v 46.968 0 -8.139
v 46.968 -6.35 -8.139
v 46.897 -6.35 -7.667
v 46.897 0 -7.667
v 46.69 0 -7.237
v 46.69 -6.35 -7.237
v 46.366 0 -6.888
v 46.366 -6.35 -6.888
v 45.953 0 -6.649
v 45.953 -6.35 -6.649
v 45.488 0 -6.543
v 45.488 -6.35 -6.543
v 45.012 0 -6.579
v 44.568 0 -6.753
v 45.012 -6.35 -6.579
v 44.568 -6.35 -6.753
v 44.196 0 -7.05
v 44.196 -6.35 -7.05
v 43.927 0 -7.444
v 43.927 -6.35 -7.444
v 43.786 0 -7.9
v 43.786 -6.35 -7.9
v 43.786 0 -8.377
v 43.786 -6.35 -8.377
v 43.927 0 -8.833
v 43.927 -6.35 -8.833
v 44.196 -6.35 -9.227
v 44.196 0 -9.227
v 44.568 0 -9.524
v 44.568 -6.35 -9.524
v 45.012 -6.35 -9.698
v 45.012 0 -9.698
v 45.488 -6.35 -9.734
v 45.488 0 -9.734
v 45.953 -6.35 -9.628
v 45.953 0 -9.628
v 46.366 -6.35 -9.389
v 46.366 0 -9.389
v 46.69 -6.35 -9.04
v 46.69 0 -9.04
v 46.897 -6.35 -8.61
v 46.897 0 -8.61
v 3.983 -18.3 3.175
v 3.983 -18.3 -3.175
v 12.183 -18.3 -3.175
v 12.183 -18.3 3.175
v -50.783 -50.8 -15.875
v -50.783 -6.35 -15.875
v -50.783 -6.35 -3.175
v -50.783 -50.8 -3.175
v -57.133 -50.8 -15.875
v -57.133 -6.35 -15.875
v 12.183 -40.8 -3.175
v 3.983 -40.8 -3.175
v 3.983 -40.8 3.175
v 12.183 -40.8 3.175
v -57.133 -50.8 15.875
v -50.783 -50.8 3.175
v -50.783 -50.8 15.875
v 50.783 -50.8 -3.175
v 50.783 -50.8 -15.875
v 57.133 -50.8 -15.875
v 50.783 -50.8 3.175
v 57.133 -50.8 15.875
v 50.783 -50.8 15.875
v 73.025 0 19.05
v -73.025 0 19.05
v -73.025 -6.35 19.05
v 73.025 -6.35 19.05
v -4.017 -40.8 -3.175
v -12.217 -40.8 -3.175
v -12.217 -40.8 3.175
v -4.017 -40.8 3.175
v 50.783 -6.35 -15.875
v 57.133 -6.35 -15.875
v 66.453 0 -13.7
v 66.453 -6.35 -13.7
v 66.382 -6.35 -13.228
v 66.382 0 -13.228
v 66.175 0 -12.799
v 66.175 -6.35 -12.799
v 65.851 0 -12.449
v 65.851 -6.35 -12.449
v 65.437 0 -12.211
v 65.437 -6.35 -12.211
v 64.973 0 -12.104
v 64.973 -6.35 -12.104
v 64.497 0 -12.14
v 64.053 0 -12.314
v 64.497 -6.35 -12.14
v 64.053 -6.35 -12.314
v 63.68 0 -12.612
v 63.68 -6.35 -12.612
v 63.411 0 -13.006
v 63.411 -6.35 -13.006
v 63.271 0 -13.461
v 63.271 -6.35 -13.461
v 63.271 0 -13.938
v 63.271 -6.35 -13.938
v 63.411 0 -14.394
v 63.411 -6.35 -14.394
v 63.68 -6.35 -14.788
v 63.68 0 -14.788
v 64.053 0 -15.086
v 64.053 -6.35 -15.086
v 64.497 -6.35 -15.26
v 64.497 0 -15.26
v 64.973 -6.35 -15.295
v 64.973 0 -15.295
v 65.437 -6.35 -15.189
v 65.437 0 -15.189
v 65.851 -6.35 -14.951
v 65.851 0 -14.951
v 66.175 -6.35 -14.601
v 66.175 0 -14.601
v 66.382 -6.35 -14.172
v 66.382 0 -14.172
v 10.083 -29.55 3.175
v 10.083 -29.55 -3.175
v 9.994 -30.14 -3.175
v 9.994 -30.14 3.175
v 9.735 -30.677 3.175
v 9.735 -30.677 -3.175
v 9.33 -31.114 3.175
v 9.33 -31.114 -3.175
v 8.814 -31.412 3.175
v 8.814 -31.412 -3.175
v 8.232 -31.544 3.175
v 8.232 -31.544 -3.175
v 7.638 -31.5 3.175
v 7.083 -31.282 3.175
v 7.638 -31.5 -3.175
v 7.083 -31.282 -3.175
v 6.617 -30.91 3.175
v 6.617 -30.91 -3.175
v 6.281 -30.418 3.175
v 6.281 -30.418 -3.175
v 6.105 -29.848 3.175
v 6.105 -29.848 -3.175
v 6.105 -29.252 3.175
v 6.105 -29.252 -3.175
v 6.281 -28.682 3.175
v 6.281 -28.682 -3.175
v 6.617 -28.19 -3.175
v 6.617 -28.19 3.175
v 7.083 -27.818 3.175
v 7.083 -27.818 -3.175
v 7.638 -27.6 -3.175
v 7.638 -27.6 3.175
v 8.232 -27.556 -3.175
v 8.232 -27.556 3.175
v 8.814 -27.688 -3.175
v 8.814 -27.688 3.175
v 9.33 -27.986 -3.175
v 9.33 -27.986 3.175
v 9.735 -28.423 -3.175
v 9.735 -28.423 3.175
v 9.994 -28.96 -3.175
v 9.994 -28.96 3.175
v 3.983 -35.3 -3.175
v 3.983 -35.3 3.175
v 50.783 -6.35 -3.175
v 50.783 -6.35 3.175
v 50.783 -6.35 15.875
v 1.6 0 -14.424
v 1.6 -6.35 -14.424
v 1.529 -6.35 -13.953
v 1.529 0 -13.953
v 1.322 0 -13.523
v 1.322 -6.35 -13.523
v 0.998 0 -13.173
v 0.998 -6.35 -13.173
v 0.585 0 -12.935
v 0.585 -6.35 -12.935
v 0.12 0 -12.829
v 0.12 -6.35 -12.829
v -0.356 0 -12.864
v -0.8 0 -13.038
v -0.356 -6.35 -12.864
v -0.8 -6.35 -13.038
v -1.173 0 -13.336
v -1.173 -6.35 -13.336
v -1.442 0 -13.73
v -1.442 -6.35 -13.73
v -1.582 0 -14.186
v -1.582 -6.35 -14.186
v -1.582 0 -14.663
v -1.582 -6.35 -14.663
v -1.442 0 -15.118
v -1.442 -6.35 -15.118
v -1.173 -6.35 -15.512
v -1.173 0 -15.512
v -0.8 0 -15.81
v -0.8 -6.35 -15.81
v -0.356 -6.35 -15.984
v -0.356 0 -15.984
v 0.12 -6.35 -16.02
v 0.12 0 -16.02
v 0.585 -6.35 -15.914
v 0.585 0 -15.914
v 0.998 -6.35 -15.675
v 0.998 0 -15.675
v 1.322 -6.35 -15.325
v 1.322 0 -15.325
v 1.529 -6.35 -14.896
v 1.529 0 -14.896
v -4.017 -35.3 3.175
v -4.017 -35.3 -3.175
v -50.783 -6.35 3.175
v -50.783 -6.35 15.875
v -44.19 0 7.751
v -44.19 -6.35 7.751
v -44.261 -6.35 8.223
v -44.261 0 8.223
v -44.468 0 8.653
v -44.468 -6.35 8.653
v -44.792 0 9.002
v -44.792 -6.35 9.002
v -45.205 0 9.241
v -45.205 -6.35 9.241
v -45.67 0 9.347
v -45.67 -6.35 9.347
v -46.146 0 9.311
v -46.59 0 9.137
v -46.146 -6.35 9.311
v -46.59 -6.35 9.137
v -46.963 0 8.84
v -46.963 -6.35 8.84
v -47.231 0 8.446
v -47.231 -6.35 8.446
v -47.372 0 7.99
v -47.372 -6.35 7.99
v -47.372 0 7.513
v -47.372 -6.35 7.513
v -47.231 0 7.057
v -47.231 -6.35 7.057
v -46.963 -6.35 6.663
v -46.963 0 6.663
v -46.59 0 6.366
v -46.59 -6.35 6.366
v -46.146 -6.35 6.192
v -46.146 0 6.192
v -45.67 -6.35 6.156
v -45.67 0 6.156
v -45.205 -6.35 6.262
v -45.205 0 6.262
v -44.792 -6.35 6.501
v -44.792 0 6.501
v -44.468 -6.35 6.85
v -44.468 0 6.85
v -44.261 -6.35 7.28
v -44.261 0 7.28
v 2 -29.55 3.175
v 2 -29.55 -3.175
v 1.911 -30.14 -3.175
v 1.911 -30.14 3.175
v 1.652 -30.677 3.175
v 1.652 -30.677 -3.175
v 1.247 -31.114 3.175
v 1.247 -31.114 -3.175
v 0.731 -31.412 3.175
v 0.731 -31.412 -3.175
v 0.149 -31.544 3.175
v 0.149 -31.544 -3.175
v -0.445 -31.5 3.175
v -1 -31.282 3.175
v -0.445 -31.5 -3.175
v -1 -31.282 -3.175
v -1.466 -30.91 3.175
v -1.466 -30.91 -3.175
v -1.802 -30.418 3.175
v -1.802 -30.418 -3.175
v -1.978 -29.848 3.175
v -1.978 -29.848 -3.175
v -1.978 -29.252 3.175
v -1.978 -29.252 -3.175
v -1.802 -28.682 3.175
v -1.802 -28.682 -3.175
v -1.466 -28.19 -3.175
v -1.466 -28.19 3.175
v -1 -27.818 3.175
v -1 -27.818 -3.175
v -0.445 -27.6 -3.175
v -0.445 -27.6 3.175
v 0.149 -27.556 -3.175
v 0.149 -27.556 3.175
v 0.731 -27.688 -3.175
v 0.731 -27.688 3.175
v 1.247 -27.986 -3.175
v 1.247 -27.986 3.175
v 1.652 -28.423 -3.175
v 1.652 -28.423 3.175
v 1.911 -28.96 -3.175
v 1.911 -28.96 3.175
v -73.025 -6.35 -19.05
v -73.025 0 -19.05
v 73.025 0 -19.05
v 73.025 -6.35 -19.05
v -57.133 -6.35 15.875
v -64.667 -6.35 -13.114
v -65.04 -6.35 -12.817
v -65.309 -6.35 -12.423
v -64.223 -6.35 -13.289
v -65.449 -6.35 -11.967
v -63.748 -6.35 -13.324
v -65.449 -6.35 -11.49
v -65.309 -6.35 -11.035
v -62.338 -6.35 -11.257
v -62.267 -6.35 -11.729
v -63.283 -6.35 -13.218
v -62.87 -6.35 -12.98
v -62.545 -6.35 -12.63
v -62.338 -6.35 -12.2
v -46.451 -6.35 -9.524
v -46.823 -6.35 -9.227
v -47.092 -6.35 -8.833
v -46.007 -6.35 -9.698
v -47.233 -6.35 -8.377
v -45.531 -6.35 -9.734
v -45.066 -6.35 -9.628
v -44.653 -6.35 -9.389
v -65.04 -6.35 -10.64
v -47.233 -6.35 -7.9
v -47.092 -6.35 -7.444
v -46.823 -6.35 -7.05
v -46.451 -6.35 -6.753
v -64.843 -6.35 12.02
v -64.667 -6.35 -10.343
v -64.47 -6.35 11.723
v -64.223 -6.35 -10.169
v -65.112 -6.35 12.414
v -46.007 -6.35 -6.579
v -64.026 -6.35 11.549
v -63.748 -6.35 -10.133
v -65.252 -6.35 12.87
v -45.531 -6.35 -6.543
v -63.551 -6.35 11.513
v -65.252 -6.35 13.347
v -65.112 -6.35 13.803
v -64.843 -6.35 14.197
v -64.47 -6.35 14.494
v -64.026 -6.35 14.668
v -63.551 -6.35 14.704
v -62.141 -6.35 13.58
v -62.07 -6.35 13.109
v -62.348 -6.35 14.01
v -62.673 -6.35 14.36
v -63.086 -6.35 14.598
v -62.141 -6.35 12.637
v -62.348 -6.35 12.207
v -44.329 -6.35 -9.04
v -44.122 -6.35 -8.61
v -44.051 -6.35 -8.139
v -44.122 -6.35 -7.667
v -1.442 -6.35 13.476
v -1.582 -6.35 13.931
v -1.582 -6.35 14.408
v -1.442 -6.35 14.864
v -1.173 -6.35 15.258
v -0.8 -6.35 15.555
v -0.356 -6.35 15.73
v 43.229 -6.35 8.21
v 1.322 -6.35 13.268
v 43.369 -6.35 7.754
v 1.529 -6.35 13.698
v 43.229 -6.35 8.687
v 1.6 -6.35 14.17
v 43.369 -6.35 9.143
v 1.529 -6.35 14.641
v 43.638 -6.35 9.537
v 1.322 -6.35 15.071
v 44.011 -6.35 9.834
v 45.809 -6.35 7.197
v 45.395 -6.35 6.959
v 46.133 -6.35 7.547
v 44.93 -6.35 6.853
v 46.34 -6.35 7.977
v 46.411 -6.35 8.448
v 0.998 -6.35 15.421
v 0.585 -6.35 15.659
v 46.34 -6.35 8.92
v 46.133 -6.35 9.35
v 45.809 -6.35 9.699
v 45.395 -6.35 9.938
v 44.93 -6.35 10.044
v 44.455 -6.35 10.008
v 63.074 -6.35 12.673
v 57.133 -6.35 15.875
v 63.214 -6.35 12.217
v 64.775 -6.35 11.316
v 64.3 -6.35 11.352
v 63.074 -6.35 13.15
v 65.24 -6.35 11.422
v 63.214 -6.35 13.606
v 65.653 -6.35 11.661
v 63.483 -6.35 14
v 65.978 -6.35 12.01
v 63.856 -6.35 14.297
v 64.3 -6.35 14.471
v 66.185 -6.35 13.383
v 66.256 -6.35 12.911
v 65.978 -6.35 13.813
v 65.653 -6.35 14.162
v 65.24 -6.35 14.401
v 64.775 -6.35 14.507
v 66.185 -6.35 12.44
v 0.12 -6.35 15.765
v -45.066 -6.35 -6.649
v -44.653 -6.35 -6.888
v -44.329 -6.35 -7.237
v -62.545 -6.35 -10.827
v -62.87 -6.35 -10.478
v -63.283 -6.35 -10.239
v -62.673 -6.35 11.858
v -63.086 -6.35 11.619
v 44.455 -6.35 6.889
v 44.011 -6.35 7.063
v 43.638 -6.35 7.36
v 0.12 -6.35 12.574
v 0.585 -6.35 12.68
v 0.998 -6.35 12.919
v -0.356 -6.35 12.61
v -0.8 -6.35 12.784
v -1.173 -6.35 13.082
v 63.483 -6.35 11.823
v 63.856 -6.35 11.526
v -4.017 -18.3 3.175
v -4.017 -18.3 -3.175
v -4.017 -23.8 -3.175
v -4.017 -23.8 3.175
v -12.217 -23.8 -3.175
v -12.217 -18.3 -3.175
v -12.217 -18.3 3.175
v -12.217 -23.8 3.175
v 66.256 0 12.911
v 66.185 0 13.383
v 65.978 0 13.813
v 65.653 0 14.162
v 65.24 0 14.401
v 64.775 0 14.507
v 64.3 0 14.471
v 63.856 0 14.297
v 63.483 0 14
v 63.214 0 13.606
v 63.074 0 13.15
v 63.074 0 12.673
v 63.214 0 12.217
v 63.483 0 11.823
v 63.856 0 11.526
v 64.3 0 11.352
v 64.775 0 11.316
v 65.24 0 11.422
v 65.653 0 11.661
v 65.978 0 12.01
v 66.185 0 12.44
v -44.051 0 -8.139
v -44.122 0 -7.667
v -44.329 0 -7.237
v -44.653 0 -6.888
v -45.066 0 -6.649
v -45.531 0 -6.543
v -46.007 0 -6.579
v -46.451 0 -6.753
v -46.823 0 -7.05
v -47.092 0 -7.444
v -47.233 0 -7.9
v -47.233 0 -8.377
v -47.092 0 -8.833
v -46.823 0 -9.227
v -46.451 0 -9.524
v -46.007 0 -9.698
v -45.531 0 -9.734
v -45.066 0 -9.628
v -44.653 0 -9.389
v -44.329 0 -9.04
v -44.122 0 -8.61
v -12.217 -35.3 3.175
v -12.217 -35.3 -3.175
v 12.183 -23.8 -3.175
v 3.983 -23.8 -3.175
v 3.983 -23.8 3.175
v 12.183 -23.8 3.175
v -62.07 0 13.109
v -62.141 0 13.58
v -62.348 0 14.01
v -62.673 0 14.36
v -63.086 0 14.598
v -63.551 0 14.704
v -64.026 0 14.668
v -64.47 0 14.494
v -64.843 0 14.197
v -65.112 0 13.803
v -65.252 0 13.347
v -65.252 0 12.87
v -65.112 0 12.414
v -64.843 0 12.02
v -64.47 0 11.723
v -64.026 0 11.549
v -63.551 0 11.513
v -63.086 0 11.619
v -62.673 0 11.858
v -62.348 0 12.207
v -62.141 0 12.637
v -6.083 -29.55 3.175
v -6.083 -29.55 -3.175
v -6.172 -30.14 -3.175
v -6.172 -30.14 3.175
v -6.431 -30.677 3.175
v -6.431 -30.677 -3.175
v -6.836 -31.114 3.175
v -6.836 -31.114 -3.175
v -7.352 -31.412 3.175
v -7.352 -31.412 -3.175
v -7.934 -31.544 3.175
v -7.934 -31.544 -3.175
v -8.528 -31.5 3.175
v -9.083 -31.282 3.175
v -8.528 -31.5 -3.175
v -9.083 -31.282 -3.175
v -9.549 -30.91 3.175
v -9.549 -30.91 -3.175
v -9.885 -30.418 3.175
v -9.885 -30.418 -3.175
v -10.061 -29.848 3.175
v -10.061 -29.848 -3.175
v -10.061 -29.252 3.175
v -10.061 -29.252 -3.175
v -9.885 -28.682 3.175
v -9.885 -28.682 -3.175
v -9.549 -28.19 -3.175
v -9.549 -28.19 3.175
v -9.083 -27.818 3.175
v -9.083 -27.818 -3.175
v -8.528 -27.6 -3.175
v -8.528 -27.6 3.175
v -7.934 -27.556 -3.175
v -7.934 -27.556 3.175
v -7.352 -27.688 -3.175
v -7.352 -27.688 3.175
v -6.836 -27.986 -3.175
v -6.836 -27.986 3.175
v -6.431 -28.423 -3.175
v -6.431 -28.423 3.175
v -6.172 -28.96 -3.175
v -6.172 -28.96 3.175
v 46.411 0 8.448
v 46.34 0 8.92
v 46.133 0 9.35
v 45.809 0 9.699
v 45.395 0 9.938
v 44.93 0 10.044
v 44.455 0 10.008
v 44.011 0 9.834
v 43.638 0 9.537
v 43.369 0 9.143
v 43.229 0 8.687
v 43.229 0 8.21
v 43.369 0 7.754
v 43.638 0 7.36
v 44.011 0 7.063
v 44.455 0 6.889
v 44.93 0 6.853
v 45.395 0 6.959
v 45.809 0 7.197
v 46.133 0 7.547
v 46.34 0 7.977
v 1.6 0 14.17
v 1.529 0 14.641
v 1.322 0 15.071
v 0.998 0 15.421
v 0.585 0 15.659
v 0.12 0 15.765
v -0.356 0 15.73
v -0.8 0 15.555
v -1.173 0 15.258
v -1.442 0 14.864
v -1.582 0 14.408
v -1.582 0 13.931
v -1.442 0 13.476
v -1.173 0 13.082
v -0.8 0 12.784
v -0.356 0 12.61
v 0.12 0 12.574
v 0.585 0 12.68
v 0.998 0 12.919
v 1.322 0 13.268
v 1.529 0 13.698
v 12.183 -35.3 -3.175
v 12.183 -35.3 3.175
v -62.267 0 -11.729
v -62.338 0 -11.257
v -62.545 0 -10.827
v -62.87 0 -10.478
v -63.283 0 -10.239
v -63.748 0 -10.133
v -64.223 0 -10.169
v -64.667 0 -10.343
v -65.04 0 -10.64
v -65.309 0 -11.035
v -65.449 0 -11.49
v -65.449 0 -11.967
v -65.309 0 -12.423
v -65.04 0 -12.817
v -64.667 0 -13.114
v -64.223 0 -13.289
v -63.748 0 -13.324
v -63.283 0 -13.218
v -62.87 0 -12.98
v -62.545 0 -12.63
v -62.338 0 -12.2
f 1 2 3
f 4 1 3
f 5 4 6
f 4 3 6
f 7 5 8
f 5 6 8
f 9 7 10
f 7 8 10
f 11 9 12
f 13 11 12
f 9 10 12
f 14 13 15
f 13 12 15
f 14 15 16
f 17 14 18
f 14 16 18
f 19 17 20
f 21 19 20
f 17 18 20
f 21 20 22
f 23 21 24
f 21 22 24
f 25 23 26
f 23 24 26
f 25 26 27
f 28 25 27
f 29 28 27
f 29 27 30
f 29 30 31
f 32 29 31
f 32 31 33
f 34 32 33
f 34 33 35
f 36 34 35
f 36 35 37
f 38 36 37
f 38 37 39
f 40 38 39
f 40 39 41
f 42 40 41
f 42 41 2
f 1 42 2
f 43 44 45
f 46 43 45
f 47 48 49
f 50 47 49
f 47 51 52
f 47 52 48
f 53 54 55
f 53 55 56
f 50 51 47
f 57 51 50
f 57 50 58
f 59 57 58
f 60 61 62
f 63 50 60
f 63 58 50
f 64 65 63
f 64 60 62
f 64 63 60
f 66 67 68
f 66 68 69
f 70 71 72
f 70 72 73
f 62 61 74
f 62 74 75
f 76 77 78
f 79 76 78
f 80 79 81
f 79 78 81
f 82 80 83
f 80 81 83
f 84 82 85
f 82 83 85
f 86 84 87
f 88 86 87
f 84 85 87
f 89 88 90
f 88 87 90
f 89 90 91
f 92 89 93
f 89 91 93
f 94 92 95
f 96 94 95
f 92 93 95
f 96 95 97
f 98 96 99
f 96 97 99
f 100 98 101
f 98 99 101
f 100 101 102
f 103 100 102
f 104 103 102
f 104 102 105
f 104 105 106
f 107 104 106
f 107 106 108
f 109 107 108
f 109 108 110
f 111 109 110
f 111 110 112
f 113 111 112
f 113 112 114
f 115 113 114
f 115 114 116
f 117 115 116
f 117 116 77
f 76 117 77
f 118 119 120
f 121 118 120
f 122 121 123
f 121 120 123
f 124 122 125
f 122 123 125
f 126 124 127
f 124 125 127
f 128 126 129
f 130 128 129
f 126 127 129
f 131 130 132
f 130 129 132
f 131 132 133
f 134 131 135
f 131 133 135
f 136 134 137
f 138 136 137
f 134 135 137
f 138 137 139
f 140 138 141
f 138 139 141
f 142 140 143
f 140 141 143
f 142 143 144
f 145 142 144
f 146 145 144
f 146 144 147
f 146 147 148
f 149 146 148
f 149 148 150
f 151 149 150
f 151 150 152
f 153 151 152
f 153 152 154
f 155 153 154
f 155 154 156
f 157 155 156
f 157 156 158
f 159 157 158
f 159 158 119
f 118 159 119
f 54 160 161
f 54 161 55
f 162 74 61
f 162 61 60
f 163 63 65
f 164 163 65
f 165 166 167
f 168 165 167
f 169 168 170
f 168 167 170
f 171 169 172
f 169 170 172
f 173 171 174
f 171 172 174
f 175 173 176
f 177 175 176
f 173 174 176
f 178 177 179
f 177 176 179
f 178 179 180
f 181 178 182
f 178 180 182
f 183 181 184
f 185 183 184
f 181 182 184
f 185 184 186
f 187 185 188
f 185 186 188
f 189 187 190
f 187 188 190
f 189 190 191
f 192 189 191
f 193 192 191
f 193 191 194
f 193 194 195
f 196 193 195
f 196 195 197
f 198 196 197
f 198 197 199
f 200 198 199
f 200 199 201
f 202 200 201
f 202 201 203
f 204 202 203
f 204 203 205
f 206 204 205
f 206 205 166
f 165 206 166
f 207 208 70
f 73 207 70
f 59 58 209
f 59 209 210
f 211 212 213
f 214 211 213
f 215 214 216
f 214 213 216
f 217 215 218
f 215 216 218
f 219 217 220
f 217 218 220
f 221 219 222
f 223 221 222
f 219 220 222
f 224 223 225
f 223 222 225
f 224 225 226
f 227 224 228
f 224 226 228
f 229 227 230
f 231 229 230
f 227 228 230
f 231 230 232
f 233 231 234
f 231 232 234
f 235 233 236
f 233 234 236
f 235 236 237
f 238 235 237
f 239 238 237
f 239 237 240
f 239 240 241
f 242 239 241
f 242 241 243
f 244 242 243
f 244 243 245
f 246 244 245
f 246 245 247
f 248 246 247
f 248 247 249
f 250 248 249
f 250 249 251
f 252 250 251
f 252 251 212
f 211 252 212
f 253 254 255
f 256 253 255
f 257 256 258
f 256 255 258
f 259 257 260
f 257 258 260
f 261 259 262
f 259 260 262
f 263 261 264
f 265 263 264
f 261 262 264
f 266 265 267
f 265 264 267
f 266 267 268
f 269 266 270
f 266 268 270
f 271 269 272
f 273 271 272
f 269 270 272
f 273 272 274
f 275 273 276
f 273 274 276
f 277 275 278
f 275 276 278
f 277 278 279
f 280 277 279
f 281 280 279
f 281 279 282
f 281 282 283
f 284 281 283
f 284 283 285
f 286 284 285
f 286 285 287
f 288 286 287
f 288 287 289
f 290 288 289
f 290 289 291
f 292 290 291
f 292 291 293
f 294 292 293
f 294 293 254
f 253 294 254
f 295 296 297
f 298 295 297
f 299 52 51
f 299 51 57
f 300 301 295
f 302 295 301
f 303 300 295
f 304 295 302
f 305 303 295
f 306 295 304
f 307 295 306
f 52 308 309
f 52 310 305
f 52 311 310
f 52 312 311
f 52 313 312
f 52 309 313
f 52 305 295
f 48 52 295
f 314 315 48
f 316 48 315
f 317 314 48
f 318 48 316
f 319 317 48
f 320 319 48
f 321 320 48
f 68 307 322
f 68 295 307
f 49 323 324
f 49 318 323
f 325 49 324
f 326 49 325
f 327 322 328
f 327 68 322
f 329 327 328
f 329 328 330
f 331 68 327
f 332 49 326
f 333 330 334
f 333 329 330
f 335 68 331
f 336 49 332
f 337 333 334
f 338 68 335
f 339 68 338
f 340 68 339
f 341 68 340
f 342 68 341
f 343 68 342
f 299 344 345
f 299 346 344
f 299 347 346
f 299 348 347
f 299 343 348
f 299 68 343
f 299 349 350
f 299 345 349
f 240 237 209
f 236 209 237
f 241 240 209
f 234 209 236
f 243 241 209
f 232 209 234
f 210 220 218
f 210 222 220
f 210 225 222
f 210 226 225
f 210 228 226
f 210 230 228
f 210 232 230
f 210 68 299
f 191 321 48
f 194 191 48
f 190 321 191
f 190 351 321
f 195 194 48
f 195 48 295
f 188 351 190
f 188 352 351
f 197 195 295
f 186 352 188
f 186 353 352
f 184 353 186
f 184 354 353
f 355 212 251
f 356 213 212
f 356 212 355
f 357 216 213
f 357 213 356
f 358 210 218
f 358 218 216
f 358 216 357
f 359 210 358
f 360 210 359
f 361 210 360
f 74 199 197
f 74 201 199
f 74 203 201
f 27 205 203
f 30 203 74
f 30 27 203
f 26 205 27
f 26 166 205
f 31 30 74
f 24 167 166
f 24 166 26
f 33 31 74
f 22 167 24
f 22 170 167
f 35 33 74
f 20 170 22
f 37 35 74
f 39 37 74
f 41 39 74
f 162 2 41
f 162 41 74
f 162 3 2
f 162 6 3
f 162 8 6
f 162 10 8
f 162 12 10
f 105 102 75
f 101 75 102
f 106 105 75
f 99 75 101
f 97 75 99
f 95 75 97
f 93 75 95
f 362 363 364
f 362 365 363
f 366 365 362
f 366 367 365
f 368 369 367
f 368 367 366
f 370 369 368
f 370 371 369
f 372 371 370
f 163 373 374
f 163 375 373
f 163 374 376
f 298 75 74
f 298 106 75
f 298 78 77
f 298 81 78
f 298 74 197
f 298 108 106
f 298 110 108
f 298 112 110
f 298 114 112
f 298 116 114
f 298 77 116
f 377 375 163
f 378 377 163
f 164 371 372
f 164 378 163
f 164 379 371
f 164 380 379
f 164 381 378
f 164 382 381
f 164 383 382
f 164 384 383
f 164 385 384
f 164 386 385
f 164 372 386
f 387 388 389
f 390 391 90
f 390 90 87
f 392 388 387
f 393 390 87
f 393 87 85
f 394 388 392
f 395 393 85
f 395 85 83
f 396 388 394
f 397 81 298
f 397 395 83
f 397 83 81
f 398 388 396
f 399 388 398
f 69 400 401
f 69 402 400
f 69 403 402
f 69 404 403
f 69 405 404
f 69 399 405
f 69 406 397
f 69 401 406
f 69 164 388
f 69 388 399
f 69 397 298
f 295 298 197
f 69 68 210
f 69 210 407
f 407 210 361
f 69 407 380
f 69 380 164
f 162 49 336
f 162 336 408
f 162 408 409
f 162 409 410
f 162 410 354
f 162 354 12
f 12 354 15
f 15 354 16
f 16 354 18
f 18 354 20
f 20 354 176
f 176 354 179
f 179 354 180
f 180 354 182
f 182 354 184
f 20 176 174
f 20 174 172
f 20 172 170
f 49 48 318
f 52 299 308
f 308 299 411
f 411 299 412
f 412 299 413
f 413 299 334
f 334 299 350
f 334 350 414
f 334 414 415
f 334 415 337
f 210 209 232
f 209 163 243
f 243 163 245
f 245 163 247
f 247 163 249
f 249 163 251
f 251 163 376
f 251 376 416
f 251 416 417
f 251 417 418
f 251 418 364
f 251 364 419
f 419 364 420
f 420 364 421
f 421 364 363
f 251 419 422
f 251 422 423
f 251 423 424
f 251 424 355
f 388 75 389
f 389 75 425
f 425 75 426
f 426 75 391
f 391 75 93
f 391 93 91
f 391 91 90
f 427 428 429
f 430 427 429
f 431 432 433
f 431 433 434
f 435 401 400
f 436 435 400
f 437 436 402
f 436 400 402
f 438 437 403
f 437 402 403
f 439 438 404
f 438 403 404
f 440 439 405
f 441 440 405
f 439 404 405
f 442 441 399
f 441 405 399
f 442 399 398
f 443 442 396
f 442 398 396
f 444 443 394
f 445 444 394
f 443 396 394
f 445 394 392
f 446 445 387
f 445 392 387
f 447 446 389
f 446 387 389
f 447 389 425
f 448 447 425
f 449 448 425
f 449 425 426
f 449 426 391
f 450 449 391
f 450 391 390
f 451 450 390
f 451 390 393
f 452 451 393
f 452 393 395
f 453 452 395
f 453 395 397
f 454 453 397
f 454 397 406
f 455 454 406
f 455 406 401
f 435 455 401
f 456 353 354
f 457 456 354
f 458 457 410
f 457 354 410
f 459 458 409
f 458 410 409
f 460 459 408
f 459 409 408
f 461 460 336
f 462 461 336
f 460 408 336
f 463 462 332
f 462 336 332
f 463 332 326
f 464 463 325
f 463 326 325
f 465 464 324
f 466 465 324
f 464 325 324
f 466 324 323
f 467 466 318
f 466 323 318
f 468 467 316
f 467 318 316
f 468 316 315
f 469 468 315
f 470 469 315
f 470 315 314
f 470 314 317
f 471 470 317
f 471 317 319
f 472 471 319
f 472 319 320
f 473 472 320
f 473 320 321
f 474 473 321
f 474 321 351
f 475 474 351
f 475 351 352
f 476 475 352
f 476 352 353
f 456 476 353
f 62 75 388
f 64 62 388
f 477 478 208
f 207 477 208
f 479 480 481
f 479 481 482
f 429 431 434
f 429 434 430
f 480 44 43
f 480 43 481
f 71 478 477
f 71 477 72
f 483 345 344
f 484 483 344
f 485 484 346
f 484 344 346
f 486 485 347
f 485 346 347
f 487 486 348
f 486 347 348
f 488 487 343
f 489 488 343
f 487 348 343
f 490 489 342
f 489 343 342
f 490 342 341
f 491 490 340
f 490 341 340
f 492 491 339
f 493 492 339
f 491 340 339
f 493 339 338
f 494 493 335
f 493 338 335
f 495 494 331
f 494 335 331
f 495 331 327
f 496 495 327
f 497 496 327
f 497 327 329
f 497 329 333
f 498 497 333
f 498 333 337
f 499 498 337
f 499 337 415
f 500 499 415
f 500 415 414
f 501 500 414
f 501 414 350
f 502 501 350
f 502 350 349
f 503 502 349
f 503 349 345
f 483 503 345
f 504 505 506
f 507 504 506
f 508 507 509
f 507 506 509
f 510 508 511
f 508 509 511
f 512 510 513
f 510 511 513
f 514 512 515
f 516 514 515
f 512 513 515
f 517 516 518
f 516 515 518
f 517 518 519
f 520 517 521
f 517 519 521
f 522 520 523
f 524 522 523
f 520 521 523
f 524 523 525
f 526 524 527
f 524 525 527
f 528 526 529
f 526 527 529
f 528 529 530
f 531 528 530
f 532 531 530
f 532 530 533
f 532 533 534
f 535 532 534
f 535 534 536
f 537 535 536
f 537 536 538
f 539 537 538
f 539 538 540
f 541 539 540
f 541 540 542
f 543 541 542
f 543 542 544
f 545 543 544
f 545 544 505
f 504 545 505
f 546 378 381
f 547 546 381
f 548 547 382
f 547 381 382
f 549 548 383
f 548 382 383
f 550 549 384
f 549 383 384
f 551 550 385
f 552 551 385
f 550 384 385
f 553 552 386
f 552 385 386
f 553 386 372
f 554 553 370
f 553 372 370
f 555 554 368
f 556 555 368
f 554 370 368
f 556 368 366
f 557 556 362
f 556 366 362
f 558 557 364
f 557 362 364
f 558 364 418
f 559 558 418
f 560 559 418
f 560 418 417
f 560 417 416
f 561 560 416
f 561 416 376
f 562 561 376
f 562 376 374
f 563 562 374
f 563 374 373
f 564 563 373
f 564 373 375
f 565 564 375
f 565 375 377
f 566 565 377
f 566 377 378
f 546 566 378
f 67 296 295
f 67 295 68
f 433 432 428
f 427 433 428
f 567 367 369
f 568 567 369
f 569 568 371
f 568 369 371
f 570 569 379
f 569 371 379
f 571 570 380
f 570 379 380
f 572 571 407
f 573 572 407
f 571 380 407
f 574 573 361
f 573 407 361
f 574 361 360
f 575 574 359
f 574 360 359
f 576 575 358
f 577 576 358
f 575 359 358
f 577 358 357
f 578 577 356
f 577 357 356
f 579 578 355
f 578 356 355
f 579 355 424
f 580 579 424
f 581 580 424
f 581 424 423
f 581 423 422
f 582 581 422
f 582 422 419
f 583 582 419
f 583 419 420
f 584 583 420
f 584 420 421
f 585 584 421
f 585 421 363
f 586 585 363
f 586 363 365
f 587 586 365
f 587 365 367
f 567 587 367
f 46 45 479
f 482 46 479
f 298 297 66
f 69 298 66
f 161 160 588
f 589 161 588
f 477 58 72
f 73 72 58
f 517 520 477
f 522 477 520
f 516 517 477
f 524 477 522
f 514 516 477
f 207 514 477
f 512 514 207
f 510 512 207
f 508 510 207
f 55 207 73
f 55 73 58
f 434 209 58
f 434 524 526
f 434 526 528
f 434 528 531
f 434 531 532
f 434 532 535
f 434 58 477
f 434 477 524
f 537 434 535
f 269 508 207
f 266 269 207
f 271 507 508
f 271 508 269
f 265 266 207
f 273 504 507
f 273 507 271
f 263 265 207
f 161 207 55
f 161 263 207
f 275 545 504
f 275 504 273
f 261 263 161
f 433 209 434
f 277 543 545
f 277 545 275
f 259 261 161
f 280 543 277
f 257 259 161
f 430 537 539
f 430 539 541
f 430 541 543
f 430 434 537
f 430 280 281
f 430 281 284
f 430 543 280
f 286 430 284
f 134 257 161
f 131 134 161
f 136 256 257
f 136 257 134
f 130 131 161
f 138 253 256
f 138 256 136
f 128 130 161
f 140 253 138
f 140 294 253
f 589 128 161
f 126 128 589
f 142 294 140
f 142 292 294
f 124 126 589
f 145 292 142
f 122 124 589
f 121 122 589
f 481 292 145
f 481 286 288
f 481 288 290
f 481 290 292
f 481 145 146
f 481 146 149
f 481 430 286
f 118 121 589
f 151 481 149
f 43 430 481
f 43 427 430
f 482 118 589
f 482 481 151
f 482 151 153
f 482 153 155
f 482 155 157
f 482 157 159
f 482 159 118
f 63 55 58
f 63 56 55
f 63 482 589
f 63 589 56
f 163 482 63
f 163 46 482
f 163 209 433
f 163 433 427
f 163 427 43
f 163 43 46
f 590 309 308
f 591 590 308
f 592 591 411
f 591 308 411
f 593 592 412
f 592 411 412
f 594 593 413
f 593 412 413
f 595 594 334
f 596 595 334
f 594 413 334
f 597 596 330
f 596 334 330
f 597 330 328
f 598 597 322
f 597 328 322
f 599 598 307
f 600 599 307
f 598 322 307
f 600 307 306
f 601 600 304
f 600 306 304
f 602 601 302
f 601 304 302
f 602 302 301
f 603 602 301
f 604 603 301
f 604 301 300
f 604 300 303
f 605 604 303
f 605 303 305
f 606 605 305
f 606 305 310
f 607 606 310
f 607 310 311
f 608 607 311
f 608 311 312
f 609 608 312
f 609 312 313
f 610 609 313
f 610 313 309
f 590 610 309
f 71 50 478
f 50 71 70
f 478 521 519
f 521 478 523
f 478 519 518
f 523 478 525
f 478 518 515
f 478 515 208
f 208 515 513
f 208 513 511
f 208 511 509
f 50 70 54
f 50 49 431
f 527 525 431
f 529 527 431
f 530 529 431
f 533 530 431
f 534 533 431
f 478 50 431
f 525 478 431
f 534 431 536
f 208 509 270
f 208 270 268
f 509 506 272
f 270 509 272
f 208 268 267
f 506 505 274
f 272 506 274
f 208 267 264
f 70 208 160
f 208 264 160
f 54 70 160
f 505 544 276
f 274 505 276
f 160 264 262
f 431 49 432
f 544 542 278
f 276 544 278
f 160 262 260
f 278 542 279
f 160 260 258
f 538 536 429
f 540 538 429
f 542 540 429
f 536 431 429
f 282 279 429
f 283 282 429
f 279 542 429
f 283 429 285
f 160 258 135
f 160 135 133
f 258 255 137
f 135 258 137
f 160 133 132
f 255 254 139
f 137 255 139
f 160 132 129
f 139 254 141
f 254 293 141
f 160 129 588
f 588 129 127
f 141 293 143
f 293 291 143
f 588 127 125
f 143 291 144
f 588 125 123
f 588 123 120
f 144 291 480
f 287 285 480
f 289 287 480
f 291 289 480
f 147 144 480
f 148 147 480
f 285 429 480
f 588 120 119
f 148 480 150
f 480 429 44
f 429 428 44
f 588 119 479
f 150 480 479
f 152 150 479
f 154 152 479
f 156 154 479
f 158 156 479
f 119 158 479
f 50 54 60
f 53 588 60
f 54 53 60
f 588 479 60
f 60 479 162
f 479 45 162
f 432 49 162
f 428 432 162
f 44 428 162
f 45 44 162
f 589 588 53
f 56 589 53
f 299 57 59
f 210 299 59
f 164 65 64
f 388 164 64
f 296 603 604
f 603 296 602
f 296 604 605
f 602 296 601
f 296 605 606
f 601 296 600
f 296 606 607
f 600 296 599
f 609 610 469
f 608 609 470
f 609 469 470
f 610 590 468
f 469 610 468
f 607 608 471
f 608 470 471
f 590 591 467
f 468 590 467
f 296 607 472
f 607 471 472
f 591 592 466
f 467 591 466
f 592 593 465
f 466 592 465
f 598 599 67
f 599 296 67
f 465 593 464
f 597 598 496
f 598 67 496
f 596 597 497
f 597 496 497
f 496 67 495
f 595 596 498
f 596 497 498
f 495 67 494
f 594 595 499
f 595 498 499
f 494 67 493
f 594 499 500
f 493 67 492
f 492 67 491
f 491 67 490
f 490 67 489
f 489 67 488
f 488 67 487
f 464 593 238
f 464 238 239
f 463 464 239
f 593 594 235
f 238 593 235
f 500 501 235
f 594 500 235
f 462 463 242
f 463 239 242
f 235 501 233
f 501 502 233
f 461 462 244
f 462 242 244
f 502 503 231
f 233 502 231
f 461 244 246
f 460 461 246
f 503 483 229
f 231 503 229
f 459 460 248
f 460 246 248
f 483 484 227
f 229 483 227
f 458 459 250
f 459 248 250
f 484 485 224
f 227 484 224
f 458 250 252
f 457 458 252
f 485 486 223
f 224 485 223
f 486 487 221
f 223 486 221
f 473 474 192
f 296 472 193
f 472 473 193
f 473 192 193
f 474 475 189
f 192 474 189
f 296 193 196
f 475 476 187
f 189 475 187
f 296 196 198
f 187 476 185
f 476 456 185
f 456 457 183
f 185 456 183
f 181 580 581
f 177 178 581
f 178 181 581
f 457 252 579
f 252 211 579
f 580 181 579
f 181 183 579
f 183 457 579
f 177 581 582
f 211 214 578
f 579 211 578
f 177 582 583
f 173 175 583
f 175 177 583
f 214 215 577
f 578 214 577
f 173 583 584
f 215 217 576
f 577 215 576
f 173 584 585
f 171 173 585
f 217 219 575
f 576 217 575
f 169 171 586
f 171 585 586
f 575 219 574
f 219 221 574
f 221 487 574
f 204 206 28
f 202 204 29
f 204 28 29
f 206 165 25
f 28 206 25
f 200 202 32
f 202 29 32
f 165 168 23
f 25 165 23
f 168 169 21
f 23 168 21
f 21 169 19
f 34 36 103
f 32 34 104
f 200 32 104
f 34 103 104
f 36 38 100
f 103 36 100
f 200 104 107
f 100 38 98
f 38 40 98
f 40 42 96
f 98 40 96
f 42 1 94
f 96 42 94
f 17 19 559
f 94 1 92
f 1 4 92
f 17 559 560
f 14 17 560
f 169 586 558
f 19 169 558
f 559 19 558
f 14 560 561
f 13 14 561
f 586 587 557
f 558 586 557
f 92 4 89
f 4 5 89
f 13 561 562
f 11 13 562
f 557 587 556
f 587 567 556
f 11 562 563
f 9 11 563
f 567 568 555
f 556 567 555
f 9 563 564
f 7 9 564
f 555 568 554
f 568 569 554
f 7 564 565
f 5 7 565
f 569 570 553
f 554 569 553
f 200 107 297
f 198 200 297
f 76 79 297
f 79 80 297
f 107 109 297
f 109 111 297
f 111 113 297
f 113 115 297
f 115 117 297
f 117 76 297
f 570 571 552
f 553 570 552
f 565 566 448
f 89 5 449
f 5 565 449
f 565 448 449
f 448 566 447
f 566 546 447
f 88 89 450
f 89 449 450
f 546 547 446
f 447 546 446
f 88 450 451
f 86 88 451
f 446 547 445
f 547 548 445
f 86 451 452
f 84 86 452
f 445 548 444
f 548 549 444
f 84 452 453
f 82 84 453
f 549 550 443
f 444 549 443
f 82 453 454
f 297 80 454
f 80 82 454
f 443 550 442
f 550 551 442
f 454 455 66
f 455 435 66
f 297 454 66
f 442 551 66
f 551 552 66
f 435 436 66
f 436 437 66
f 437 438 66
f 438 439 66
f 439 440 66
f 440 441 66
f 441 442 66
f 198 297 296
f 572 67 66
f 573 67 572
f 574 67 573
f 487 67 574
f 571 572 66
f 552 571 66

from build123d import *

# Parameters (mm, degrees)
F0_W      = 146.05
F0_H      = 38.1
F1_DEPTH  = 6.35
F2_W      = 101.6
F2_H      = 6.35
F3_DEPTH  = 44.45
F4_W      = 6.35
F4_H      = 31.75
F5_DEPTH  = 44.45
F6_R      = 1.6
F7_DEPTH  = 6.351
F8_W      = 8.2
F8_H      = 5.5
F9_DEPTH  = 22.226
F10_R     = 2
F11_DEPTH = 22.226


with BuildPart() as f1:
    # F0 (on Front) → F1 (new body)
    with BuildSketch(Plane.XZ):
        Rectangle(F0_W, F0_H)
    extrude(amount=F1_DEPTH)

    # F2 (on face) → F3 (join)
    with BuildSketch(Plane.XZ.offset(6.35)):
        Rectangle(F2_W, F2_H)
    extrude(amount=F3_DEPTH)

    # F4 (on face) → F5 (join)
    with BuildSketch(Plane.XZ.offset(6.35)):
        with Locations((-53.957961, 0)):
            Rectangle(F4_W, F4_H)
        with Locations((53.957961, 0)):
            Rectangle(F4_W, F4_H)
    extrude(amount=F5_DEPTH)

    # F6 (on face) → F7 (cut, through all)
    with BuildSketch(Plane.XZ.offset(6.35)):
        with Locations((0, 14.169781)):
            Circle(F6_R)
        with Locations((44.810925, 8.448409)):
            Circle(F6_R)
        with Locations((64.655818, 12.911452)):
            Circle(F6_R)
        with Locations((64.852946, -13.699939)):
            Circle(F6_R)
        with Locations((45.368467, -8.138511)):
            Circle(F6_R)
        with Locations((0, -14.424114)):
            Circle(F6_R)
        with Locations((-45.650516, -8.138511)):
            Circle(F6_R)
        with Locations((-45.789901, 7.751479)):
            Circle(F6_R)
        with Locations((-63.670218, 13.108574)):
            Circle(F6_R)
        with Locations((-63.867338, -11.728724)):
            Circle(F6_R)
    extrude(amount=-F7_DEPTH, mode=Mode.SUBTRACT)

    # F8 (on face) → F9 (cut, through all)
    with BuildSketch(Plane(origin=(0, 0, -3.175), x_dir=(1, 0, 0), z_dir=(0, 0, -1))):
        with Locations((-8.117039, 38.05)):
            Rectangle(F8_W, F8_H)
        with Locations((8.082961, 38.05)):
            Rectangle(F8_W, F8_H)
        with Locations((-8.117039, 21.05)):
            Rectangle(F8_W, F8_H)
        with Locations((8.082961, 21.05)):
            Rectangle(F8_W, F8_H)
    extrude(amount=-F9_DEPTH, mode=Mode.SUBTRACT)

    # F10 (on face) → F11 (cut, through all)
    with BuildSketch(Plane(origin=(0, 0, -3.175), x_dir=(1, 0, 0), z_dir=(0, 0, -1))):
        with Locations((0, 29.55)):
            Circle(F10_R)
        with Locations((8.083, 29.55)):
            Circle(F10_R)
        with Locations((-8.083, 29.55)):
            Circle(F10_R)
    extrude(amount=-F11_DEPTH, mode=Mode.SUBTRACT)


solid = f1.part
